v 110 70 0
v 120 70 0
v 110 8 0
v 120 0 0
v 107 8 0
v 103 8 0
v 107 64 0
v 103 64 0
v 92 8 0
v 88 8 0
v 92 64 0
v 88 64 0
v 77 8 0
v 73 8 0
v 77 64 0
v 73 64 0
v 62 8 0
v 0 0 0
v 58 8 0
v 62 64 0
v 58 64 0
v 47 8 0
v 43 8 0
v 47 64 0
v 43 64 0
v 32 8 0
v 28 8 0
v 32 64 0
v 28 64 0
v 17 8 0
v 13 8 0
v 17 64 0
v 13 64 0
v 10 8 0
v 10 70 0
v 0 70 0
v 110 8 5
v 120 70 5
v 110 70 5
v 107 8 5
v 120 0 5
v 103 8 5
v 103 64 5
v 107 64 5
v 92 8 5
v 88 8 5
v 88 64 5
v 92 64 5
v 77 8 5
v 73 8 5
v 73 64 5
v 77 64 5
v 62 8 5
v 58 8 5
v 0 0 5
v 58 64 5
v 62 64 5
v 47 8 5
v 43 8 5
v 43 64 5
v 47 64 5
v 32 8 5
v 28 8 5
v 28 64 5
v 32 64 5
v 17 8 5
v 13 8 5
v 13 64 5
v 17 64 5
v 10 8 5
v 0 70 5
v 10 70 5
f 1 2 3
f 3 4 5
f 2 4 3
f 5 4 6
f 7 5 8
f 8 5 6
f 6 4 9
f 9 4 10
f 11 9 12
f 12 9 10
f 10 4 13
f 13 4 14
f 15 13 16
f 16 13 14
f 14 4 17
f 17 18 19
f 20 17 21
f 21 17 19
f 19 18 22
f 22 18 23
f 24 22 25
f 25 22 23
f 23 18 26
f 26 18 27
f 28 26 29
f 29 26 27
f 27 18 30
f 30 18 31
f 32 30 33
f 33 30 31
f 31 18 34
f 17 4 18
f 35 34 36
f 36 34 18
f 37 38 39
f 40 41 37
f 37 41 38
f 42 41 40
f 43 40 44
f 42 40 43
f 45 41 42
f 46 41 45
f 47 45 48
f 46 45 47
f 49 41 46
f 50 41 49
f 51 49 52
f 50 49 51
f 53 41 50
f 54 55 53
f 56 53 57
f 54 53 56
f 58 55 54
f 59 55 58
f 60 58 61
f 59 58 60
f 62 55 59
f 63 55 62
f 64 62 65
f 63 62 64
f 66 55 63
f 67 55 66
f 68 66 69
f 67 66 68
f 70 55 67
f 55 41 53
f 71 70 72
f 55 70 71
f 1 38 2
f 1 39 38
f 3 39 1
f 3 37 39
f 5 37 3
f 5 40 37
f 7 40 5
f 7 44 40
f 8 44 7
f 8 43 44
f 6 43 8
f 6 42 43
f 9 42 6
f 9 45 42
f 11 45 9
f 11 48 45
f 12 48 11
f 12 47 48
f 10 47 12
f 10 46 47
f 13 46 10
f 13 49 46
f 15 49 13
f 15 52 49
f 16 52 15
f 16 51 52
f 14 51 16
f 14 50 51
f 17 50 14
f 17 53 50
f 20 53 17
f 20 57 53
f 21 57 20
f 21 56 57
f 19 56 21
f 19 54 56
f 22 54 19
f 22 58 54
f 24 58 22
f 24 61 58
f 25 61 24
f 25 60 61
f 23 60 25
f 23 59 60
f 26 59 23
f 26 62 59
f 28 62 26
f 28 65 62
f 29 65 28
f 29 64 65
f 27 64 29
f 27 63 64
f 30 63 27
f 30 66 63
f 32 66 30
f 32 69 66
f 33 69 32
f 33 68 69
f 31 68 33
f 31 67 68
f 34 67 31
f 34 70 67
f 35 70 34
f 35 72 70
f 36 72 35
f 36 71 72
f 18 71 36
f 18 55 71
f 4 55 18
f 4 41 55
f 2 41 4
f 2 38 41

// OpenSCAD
$fn = 32;

// ----------------------------------------------------------------------
// Guard grille: 7 slats over a 120 x 70 mm plate
// ----------------------------------------------------------------------

// --- parameters (mm) ---
profile_height = 5;       // extrusion height
profile_points = 36;      // points of the closed outline

profile = [[0, 0], [120, 0], [120, 70], [110, 70], [110, 8], [107, 8], [107, 64], [103, 64], [103, 8], [92, 8], [92, 64], [88, 64], [88, 8], [77, 8], [77, 64], [73, 64], [73, 8], [62, 8], [62, 64], [58, 64], [58, 8], [47, 8], [47, 64], [43, 64], [43, 8], [32, 8], [32, 64], [28, 64], [28, 8], [17, 8], [17, 64], [13, 64], [13, 8], [10, 8], [10, 70], [0, 70]];  // single closed polygon, 36 points, counter clockwise

// --- the one profile operation ---
linear_extrude(height = profile_height) polygon(points = profile);
